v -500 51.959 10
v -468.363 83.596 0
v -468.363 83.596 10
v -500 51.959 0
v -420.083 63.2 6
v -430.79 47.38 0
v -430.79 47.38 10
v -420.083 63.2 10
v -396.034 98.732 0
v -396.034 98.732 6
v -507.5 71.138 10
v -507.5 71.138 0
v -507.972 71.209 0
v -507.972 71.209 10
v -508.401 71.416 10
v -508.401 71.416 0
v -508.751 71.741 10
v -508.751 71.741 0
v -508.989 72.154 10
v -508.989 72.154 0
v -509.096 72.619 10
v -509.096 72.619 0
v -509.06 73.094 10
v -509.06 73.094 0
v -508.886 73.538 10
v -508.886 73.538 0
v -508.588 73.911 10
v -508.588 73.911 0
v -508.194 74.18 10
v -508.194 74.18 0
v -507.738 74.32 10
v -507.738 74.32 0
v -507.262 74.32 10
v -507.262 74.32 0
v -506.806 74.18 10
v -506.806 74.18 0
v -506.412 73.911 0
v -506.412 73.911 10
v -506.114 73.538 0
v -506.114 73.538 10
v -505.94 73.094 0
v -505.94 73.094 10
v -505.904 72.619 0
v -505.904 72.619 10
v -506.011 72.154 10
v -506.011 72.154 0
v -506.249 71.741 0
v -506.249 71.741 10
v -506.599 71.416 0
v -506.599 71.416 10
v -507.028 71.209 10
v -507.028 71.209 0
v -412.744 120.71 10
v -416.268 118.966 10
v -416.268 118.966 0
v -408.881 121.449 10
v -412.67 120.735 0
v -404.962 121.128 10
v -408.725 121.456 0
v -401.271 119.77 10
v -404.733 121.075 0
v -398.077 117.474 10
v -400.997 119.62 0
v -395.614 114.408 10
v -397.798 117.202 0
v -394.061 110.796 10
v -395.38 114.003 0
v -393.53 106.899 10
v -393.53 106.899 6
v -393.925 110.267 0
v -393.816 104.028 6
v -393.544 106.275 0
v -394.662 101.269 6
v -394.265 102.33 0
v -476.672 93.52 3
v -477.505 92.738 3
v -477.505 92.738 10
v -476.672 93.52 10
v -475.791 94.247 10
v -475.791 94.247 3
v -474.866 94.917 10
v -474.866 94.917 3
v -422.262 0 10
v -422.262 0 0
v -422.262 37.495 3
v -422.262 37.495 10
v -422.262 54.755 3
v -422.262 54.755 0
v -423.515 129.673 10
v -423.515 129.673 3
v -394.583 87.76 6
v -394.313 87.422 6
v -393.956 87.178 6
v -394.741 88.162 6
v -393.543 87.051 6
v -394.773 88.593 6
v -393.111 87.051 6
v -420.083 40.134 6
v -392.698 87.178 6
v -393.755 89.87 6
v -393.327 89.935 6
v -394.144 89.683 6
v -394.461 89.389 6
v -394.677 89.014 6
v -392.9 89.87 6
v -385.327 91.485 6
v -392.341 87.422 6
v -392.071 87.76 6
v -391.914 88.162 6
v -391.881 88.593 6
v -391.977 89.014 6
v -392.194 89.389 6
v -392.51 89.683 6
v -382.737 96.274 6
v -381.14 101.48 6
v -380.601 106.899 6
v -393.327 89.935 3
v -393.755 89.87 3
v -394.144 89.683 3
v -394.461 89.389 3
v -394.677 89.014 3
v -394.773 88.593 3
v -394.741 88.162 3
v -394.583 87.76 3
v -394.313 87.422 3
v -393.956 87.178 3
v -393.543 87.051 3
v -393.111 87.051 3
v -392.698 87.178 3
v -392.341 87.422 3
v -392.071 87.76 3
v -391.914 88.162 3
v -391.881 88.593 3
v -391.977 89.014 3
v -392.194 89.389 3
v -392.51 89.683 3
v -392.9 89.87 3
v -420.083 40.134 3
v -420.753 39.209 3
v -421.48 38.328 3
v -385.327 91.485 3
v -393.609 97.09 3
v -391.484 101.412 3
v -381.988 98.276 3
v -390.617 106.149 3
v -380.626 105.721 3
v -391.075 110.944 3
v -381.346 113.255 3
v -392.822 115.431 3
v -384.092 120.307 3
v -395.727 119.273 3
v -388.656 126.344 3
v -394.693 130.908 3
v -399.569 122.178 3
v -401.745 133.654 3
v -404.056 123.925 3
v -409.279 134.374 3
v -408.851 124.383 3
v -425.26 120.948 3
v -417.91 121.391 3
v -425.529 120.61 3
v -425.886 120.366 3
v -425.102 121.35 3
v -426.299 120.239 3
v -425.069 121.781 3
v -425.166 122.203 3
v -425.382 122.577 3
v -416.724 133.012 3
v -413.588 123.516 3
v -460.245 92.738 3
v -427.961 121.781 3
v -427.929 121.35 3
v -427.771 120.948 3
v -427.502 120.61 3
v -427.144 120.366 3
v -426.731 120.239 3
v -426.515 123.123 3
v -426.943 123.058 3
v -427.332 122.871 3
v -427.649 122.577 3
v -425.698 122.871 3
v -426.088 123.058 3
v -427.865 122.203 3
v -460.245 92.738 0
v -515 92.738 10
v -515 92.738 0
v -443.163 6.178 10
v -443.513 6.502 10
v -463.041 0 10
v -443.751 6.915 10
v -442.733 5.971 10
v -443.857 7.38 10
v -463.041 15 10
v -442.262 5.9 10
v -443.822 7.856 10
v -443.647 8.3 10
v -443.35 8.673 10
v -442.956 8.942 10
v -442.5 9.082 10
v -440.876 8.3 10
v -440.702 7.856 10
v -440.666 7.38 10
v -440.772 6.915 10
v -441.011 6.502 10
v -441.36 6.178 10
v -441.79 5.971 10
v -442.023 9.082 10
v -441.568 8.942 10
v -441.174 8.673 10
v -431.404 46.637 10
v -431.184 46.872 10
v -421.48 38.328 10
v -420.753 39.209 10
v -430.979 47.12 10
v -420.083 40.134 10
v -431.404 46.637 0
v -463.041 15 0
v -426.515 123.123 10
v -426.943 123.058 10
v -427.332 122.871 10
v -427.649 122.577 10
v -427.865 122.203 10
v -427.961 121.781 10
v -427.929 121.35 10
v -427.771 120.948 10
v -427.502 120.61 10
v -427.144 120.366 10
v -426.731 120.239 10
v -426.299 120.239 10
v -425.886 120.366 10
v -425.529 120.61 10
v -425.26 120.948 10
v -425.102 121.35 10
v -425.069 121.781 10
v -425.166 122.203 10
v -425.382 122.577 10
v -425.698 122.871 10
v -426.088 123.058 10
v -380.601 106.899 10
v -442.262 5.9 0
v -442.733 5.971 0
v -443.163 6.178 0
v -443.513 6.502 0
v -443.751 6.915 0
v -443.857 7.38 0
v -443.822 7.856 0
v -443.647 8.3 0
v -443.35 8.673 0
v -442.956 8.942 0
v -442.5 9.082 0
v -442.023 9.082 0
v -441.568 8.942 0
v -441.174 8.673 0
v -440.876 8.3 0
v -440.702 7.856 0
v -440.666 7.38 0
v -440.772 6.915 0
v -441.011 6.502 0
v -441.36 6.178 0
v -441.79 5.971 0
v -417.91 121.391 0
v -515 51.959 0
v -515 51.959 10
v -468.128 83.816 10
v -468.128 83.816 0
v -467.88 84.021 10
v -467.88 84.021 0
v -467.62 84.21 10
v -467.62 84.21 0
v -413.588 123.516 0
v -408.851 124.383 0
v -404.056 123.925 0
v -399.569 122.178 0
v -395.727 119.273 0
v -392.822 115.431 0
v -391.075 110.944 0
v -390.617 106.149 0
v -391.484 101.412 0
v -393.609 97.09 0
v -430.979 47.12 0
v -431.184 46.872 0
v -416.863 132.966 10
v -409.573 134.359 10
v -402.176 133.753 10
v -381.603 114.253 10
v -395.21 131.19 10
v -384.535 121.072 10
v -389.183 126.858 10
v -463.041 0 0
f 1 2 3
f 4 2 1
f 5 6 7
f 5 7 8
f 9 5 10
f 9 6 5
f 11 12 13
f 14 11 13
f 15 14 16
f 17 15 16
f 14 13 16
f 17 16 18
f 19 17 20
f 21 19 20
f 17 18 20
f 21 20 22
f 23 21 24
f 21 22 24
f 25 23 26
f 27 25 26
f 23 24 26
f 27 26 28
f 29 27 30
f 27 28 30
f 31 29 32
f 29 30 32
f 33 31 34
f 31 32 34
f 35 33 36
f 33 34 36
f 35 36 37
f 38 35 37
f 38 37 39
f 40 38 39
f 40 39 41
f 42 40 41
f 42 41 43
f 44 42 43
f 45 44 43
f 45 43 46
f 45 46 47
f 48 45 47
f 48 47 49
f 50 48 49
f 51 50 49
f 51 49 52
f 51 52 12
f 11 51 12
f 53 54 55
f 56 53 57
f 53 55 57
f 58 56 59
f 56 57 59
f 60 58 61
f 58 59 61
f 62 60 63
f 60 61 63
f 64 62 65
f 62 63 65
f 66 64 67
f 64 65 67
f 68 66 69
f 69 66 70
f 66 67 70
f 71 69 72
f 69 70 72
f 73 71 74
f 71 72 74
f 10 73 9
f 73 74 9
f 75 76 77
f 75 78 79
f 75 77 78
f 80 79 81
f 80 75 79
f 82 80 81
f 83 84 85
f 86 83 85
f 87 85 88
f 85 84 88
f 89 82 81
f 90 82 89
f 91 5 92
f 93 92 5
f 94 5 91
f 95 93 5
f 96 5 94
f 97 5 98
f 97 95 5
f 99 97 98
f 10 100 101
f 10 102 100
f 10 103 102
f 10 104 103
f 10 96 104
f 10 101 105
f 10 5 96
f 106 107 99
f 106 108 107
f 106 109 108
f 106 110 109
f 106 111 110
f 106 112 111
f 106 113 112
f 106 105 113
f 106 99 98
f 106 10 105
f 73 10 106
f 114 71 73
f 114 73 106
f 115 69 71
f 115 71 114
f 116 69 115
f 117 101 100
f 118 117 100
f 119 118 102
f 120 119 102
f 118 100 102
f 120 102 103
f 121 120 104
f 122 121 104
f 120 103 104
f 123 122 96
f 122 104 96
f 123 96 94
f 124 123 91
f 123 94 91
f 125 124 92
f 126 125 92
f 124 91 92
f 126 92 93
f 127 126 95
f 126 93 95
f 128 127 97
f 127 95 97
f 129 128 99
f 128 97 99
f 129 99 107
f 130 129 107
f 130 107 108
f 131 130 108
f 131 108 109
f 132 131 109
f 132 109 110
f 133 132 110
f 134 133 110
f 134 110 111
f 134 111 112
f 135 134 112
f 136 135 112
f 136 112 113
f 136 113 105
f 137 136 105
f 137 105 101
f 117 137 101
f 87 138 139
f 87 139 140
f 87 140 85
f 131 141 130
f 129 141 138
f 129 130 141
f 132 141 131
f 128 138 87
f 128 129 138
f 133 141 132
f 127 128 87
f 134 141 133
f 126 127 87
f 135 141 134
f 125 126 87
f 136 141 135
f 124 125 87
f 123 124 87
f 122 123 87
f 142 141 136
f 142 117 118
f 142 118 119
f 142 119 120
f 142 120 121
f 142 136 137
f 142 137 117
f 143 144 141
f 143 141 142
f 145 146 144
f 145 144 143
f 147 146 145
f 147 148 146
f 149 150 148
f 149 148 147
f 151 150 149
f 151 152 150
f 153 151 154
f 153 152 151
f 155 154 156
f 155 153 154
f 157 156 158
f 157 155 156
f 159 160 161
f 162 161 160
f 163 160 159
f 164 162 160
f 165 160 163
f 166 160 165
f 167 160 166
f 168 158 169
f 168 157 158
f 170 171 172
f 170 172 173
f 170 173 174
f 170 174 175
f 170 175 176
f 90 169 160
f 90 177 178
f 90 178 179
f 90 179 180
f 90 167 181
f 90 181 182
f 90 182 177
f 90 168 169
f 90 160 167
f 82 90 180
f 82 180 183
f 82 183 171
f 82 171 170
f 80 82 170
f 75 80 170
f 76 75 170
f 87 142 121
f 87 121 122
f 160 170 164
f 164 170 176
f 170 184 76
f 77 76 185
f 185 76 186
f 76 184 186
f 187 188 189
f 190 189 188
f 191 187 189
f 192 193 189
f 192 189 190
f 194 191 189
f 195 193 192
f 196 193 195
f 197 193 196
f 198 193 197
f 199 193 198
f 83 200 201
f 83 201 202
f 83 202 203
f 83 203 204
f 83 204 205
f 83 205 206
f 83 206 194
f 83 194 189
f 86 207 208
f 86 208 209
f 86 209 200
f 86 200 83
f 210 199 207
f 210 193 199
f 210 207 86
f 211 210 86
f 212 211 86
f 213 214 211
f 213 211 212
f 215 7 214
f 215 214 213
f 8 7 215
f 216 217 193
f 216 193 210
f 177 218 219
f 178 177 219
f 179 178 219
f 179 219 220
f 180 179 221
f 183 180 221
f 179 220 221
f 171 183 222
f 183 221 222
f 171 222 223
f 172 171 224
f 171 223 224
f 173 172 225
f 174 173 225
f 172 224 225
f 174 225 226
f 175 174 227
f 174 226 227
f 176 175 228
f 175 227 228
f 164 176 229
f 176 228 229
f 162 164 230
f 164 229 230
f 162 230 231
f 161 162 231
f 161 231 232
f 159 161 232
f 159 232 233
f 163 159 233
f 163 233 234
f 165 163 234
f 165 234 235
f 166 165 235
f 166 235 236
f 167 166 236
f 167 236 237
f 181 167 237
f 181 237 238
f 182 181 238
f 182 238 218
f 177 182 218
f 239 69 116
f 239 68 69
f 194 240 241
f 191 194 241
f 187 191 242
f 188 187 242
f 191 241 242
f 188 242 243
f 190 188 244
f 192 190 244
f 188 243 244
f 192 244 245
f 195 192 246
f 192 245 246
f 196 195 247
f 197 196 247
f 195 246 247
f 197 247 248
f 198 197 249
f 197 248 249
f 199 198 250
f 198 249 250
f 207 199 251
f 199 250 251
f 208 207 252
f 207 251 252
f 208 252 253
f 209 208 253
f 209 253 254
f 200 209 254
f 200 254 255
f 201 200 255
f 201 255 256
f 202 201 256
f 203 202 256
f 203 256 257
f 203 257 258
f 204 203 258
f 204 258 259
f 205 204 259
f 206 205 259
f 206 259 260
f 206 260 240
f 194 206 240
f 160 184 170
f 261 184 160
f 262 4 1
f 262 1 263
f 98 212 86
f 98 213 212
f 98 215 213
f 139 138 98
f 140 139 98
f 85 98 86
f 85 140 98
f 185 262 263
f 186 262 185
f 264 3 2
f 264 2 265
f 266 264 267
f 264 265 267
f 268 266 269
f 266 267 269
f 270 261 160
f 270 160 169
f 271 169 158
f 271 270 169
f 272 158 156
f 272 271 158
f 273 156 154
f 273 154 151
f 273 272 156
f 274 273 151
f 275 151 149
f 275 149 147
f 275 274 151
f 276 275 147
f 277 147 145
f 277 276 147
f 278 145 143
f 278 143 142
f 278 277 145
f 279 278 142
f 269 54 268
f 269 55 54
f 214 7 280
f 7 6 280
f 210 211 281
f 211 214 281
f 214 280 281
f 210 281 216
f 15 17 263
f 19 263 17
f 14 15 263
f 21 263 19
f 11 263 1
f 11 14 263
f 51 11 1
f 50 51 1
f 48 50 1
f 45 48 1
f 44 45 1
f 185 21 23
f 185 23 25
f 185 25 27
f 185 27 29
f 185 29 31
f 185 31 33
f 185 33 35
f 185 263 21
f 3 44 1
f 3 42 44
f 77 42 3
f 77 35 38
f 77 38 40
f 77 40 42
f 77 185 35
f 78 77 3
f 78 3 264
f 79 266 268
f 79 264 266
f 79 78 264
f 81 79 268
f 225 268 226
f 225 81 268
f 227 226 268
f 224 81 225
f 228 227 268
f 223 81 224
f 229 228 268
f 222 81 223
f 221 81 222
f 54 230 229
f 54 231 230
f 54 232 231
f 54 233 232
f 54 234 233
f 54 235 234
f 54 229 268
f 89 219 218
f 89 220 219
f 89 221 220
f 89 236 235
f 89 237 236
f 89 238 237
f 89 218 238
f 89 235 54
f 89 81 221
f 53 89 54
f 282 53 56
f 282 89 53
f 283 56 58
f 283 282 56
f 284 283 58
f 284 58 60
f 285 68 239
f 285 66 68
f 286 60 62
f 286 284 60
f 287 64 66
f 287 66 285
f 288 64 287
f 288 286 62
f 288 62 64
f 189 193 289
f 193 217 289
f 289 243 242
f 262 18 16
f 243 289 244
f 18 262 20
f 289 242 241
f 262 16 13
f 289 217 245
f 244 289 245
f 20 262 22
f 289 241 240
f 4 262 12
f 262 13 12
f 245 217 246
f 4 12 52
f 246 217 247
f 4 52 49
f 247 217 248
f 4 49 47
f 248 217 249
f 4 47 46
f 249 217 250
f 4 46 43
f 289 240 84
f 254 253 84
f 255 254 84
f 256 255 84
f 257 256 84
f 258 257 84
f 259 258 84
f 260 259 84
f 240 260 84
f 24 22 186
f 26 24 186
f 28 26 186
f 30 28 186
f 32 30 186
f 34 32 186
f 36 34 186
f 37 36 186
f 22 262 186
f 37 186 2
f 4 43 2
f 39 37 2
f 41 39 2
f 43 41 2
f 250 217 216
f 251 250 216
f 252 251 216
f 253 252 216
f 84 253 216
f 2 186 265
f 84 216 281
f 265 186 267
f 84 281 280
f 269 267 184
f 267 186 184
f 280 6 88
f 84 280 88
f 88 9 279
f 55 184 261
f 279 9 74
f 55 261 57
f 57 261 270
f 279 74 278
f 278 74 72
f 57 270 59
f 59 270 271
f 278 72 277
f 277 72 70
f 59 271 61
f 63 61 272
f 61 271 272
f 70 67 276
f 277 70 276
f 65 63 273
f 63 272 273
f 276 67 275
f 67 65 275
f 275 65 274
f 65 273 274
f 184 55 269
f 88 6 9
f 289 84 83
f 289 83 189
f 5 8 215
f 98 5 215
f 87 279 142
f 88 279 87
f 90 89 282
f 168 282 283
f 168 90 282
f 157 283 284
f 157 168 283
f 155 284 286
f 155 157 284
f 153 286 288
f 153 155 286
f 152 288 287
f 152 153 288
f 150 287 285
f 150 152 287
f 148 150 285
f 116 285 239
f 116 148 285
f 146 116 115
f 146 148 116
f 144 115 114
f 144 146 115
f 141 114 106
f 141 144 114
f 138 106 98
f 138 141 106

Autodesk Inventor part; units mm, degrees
ref_plane "YZ Plane" through (0, 0, 0) normal (1, 0, 0) x (0, 1, 0)
ref_plane "XZ Plane" through (0, 0, 0) normal (0, 1, 0) x (-1, 0, 0)
ref_plane "XY Plane" through (0, 0, 0) normal (0, 0, 1) x (1, 0, 0)
sketch "Sketch13" plane through (0, 0, 0) normal (0, 0, 1) x (1, 0, 0)
  line L0 (-500, 9) -> (0, 9) construction
  line L1 (0, 9) -> (0, 15) projected
  line L2 (0, 15) -> (-500, 15) projected
  line L3 (-500, 9) -> (-500, 15) projected
  line L4 (6, 15) -> (6, 375) projected
  line L5 (0, 375) -> (6, 375) projected
  line L6 (0, 15) -> (0, 375) projected
  line L7 (0, 15) -> (6, 15) projected
  line L8 (-506, 375) -> (-506, 15) construction
  line L9 (-506, 15) -> (-500, 15) projected
  line L10 (-500, 15) -> (-500, 375) projected
  line L11 (-506, 375) -> (-500, 375) projected
  line L12 (-463.8988, 17.0711) -> (-473.7868, 17.0711) projected
  line L13 (-473.7868, 17.0711) -> (-497.9289, 41.2132) projected
  line L14 (-497.9289, 41.2132) -> (-497.9289, 51.1012) projected
  line L15 (-497.9289, 51.1012) -> (-466.8985, 82.1316) projected
  arc A0 (-466.4587, 82.4947) -> (-466.8985, 82.1316) centre (-464.7772, 80.0103) ccw projected
  line L16 (-466.4587, 82.4947) -> (-415.1076, 117.2506) projected
  arc A1 (-397.7494, 99.8924) -> (-415.1076, 117.2506) centre (-408.1012, 106.8988) ccw projected
  line L17 (-397.7494, 99.8924) -> (-432.5053, 48.5413) projected
  arc A2 (-432.8684, 48.1015) -> (-432.5053, 48.5413) centre (-434.9897, 50.2228) ccw projected
  line L18 (-432.8684, 48.1015) -> (-463.8988, 17.0711) projected
  circle A3 centre (-460.0736, 33.7132) radius 4 projected
  circle A4 centre (-438.8604, 54.9264) radius 4 projected
  circle A5 centre (-460.0736, 76.1396) radius 4 projected
  circle A6 centre (-481.2868, 54.9264) radius 4 projected
  circle A7 centre (-460.0736, 54.9264) radius 13 projected
  line L19 (-430.7901, 47.3804) -> (-396.0343, 98.7315)
  arc A8 (-396.0343, 98.7315) -> (-416.2685, 118.9657) centre (-408.1012, 106.8988) ccw
  line L20 (-416.2685, 118.9657) -> (-467.6196, 84.2099)
  arc A9 (-467.6196, 84.2099) -> (-468.363, 83.5961) centre (-464.7772, 80.0103) ccw
  line L21 (-468.363, 83.5961) -> (-500, 51.9591)
  line L22 (-500, 51.9591) -> (-500, 40.3553)
  line L23 (-500, 40.3553) -> (-474.6447, 15)
  line L24 (-474.6447, 15) -> (-463.0409, 15)
  line L25 (-463.0409, 15) -> (-431.4039, 46.637)
  arc A10 (-431.4039, 46.637) -> (-430.7901, 47.3804) centre (-434.9897, 50.2228) ccw
  line L26 (-385.3272, 91.4847) -> (-420.0831, 40.1336)
  arc A11 (-422.2618, 37.4949) -> (-420.0831, 40.1336) centre (-434.9897, 50.2228) ccw
  line L27 (-422.2618, 37.4949) -> (-457.6856, 2.0711)
  line L28 (-457.6856, 2.0711) -> (-480, 2.0711)
  line L29 (-480, 2.0711) -> (-512.9289, 35)
  line L30 (-512.9289, 35) -> (-512.9289, 57.3144)
  line L31 (-512.9289, 57.3144) -> (-477.5051, 92.7382)
  arc A12 (-474.8664, 94.9169) -> (-477.5051, 92.7382) centre (-464.7772, 80.0103) ccw
  line L32 (-474.8664, 94.9169) -> (-423.5153, 129.6728)
  arc A13 (-385.3272, 91.4847) -> (-423.5153, 129.6728) centre (-408.1012, 106.8988) ccw
  line L33 (-422.2618, 37.4949) -> (-422.2618, 0)
  line L34 (-477.5051, 92.7382) -> (-515, 92.7382)
  line L35 (0, 6) -> (-500, 6) construction
  line L36 (-500, 0) -> (-500, 6) projected
  line L37 (0, 0) -> (-500, 0) projected
  line L38 (0, 0) -> (0, 6) projected
  line L39 (-509, 15) -> (-509, 375) construction
  line L40 (-515, 375) -> (-509, 375) projected
  line L41 (-515, 15) -> (-515, 375) projected
  line L42 (-515, 15) -> (-509, 15) projected
  line L43 (-500, 51.9591) -> (-515, 51.9591)
  line L44 (-463.0409, 15) -> (-463.0409, 0)
  point P0 (-422.2618, 15)
  point P1 (-500, 92.7382)
  dimension "d27" = 15
extrude "Extrusion14" add sketch "Sketch13" along normal blind 10 contours L25 A10 L19 A8 L20 A9 L21 L10 L31 A12 L32 A13 L26 A11 L27 L2 | L2 L27 L28 L44 | L27 L33 L2 | L2 L33 L37 L44 L28 L27 | L43 L30 L31 L10 | L31 L30 L43 L41 L34 L10 | L10 L34 L31
sketch "Sketch14" plane through (0, 0, 0) normal (0, 0, -1) x (-1, 0, 0)
  line L0 (467.6196, 84.2099) -> (416.2685, 118.9657) projected
  arc A0 (468.363, 83.5961) -> (467.6196, 84.2099) centre (464.7772, 80.0103) ccw projected
  line L1 (500, 51.9591) -> (468.363, 83.5961) projected
  line L2 (515, 51.9591) -> (500, 51.9591) projected
  line L3 (515, 92.7382) -> (515, 51.9591) projected
  line L4 (477.5051, 92.7382) -> (515, 92.7382) projected
  arc A1 (477.5051, 92.7382) -> (474.8664, 94.9169) centre (464.7772, 80.0103) ccw projected
  line L5 (423.5153, 129.6728) -> (474.8664, 94.9169) projected
  arc A2 (423.5153, 129.6728) -> (385.3272, 91.4847) centre (408.1012, 106.8988) ccw projected
  line L6 (420.0831, 40.1336) -> (385.3272, 91.4847) projected
  arc A3 (420.0831, 40.1336) -> (422.2618, 37.4949) centre (434.9897, 50.2228) ccw projected
  line L7 (422.2618, 0) -> (422.2618, 37.4949) projected
  line L8 (463.0409, 0) -> (422.2618, 0) projected
  line L9 (463.0409, 15) -> (463.0409, 0) projected
  line L10 (431.4039, 46.637) -> (463.0409, 15) projected
  arc A4 (430.7901, 47.3804) -> (431.4039, 46.637) centre (434.9897, 50.2228) ccw projected
  line L11 (396.0343, 98.7315) -> (430.7901, 47.3804) projected
  arc A5 (416.2685, 118.9657) -> (396.0343, 98.7315) centre (408.1012, 106.8988) ccw projected
  arc A6 (421.8736, 127.2472) -> (387.7528, 93.1264) centre (408.1012, 106.8988) ccw
  line L12 (421.8736, 127.2472) -> (473.2247, 92.4914)
  arc A7 (476.2278, 89.8093) -> (473.2247, 92.4914) centre (464.7772, 80.0103) ccw
  line L13 (476.2278, 89.8093) -> (512.0711, 89.8093)
  line L14 (512.0711, 89.8093) -> (512.0711, 54.888)
  line L15 (512.0711, 54.888) -> (501.2132, 54.888)
  line L16 (501.2132, 54.888) -> (470.434, 85.6672)
  arc A8 (470.434, 85.6672) -> (469.2613, 86.6355) centre (464.7772, 80.0103) ccw
  line L17 (469.2613, 86.6355) -> (417.9102, 121.3913)
  arc A9 (417.9102, 121.3913) -> (393.6087, 97.0898) centre (408.1012, 106.8988) ccw
  line L18 (393.6087, 97.0898) -> (428.3645, 45.7387)
  arc A10 (428.3645, 45.7387) -> (429.3328, 44.566) centre (434.9897, 50.2228) ccw
  line L19 (429.3328, 44.566) -> (460.112, 13.7868)
  line L20 (460.112, 13.7868) -> (460.112, 2.9289)
  line L21 (460.112, 2.9289) -> (425.1907, 2.9289)
  line L22 (425.1907, 2.9289) -> (425.1907, 38.7722)
  arc A11 (422.5086, 41.7753) -> (425.1907, 38.7722) centre (434.9897, 50.2228) ccw
  line L23 (422.5086, 41.7753) -> (387.7528, 93.1264)
  line L24 (422.2618, 0) -> (422.2618, 37.4949) projected
  line L25 (422.2618, 37.4949) -> (422.2618, 54.7554)
  line L26 (477.5051, 92.7382) -> (515, 92.7382) projected
  line L27 (477.5051, 92.7382) -> (455.0191, 92.7382)
  line L28 (467.6196, 84.2099) -> (416.2685, 118.9657) projected
  point P0 (0, 0)
  point P1 (460.2446, 92.7382)
  dimension "d32" = 10
extrude "Extrusion15" cut sketch "Sketch14" against normal blind 3 contours L17 A9 L18 L25 L23 A6 L12 L27 | L12 A6 L23 L25 A3 L6 A2 L5 A1 L27
sketch "Sketch15" plane through (0, 0, 10) normal (0, 0, 1) x (1, 0, 0)
  line L0 (-467.6196, 84.2099) -> (-416.2685, 118.9657) projected
  arc A0 (-396.0343, 98.7315) -> (-416.2685, 118.9657) centre (-408.1012, 106.8988) ccw projected
  line L1 (-396.0343, 98.7315) -> (-430.7901, 47.3804) projected
  arc A1 (-431.4039, 46.637) -> (-430.7901, 47.3804) centre (-434.9897, 50.2228) ccw projected
  line L2 (-431.4039, 46.637) -> (-463.0409, 15) projected
  line L3 (-463.0409, 15) -> (-463.0409, 0) projected
  line L4 (-463.0409, 0) -> (-422.2618, 0) projected
  line L5 (-422.2618, 0) -> (-422.2618, 37.4949) projected
  arc A2 (-422.2618, 37.4949) -> (-420.0831, 40.1336) centre (-434.9897, 50.2228) ccw projected
  line L6 (-420.0831, 40.1336) -> (-385.3272, 91.4847) projected
  arc A3 (-385.3272, 91.4847) -> (-423.5153, 129.6728) centre (-408.1012, 106.8988) ccw projected
  line L7 (-423.5153, 129.6728) -> (-474.8664, 94.9169) projected
  arc A4 (-474.8664, 94.9169) -> (-477.5051, 92.7382) centre (-464.7772, 80.0103) ccw projected
  line L8 (-477.5051, 92.7382) -> (-515, 92.7382) projected
  line L9 (-515, 92.7382) -> (-515, 51.9591) projected
  line L10 (-515, 51.9591) -> (-500, 51.9591) projected
  line L11 (-500, 51.9591) -> (-468.363, 83.5961) projected
  arc A5 (-467.6196, 84.2099) -> (-468.363, 83.5961) centre (-464.7772, 80.0103) ccw projected
  line L12 (-396.0343, 98.7315) -> (-430.7901, 47.3804) projected
  line L13 (-420.0831, 40.1336) -> (-385.3272, 91.4847) projected
  line L14 (-420.0831, 63.1999) -> (-420.0831, 40.1336)
  arc A6 (-396.0343, 98.7315) -> (-416.2685, 118.9657) centre (-408.1012, 106.8988) ccw projected
  line L15 (-393.5302, 106.8988) -> (-380.6012, 106.8988)
  arc A7 (-385.3272, 91.4847) -> (-423.5153, 129.6728) centre (-408.1012, 106.8988) ccw projected
  point P0 (0, 0)
extrude "Extrusion16" cut sketch "Sketch15" against normal blind 4 contours L15 A3 L6 L14 L1 A0
sketch "Sketch16" plane through (0, 0, 3) normal (0, 0, -1) x (-1, 0, 0)
  line L0 (420.0831, 40.1336) -> (385.3272, 91.4847) projected
  arc A0 (423.5153, 129.6728) -> (385.3272, 91.4847) centre (408.1012, 106.8988) ccw projected
  line L1 (423.5153, 129.6728) -> (474.8664, 94.9169) projected
  point P0 (0, 0)
  point P1 (393.3272, 88.4847)
  point P2 (426.5153, 121.6728)
  dimension "d37" = 8
  dimension "d38" = 3
  dimension "d39" = 8
  dimension "d40" = 3
hole "Hole1" at (-393.3272, 88.4847, 3) at (-426.5153, 121.6728, 3) direction (0, 0, 1) diameter 2.9 end through all
sketch "Sketch17" plane through (0, 0, 10) normal (0, 0, 1) x (1, 0, 0)
  line L0 (-422.2618, 0) -> (-422.2618, 37.4949) projected
  line L1 (-477.5051, 92.7382) -> (-515, 92.7382) projected
  point P0 (0, 0)
  point P1 (-442.2618, 7.5)
  point P2 (-507.5, 72.7382)
  point P3 (-422.2618, 18.7474)
  dimension "d48" = 7.5
  dimension "d49" = 7.5
  dimension "d50" = 20
  dimension "d51" = 20
hole "Hole2" at (-442.2618, 7.5, 10) at (-507.5, 72.7382, 10) direction (0, 0, -1) diameter 3.2 end through all
equation "\"d40\" = d38"
equation "\"d49\" = d48"
equation "\"d51\" = d50"
properties part number "Front Right Cover Bracket" material "ABS Plastic"
